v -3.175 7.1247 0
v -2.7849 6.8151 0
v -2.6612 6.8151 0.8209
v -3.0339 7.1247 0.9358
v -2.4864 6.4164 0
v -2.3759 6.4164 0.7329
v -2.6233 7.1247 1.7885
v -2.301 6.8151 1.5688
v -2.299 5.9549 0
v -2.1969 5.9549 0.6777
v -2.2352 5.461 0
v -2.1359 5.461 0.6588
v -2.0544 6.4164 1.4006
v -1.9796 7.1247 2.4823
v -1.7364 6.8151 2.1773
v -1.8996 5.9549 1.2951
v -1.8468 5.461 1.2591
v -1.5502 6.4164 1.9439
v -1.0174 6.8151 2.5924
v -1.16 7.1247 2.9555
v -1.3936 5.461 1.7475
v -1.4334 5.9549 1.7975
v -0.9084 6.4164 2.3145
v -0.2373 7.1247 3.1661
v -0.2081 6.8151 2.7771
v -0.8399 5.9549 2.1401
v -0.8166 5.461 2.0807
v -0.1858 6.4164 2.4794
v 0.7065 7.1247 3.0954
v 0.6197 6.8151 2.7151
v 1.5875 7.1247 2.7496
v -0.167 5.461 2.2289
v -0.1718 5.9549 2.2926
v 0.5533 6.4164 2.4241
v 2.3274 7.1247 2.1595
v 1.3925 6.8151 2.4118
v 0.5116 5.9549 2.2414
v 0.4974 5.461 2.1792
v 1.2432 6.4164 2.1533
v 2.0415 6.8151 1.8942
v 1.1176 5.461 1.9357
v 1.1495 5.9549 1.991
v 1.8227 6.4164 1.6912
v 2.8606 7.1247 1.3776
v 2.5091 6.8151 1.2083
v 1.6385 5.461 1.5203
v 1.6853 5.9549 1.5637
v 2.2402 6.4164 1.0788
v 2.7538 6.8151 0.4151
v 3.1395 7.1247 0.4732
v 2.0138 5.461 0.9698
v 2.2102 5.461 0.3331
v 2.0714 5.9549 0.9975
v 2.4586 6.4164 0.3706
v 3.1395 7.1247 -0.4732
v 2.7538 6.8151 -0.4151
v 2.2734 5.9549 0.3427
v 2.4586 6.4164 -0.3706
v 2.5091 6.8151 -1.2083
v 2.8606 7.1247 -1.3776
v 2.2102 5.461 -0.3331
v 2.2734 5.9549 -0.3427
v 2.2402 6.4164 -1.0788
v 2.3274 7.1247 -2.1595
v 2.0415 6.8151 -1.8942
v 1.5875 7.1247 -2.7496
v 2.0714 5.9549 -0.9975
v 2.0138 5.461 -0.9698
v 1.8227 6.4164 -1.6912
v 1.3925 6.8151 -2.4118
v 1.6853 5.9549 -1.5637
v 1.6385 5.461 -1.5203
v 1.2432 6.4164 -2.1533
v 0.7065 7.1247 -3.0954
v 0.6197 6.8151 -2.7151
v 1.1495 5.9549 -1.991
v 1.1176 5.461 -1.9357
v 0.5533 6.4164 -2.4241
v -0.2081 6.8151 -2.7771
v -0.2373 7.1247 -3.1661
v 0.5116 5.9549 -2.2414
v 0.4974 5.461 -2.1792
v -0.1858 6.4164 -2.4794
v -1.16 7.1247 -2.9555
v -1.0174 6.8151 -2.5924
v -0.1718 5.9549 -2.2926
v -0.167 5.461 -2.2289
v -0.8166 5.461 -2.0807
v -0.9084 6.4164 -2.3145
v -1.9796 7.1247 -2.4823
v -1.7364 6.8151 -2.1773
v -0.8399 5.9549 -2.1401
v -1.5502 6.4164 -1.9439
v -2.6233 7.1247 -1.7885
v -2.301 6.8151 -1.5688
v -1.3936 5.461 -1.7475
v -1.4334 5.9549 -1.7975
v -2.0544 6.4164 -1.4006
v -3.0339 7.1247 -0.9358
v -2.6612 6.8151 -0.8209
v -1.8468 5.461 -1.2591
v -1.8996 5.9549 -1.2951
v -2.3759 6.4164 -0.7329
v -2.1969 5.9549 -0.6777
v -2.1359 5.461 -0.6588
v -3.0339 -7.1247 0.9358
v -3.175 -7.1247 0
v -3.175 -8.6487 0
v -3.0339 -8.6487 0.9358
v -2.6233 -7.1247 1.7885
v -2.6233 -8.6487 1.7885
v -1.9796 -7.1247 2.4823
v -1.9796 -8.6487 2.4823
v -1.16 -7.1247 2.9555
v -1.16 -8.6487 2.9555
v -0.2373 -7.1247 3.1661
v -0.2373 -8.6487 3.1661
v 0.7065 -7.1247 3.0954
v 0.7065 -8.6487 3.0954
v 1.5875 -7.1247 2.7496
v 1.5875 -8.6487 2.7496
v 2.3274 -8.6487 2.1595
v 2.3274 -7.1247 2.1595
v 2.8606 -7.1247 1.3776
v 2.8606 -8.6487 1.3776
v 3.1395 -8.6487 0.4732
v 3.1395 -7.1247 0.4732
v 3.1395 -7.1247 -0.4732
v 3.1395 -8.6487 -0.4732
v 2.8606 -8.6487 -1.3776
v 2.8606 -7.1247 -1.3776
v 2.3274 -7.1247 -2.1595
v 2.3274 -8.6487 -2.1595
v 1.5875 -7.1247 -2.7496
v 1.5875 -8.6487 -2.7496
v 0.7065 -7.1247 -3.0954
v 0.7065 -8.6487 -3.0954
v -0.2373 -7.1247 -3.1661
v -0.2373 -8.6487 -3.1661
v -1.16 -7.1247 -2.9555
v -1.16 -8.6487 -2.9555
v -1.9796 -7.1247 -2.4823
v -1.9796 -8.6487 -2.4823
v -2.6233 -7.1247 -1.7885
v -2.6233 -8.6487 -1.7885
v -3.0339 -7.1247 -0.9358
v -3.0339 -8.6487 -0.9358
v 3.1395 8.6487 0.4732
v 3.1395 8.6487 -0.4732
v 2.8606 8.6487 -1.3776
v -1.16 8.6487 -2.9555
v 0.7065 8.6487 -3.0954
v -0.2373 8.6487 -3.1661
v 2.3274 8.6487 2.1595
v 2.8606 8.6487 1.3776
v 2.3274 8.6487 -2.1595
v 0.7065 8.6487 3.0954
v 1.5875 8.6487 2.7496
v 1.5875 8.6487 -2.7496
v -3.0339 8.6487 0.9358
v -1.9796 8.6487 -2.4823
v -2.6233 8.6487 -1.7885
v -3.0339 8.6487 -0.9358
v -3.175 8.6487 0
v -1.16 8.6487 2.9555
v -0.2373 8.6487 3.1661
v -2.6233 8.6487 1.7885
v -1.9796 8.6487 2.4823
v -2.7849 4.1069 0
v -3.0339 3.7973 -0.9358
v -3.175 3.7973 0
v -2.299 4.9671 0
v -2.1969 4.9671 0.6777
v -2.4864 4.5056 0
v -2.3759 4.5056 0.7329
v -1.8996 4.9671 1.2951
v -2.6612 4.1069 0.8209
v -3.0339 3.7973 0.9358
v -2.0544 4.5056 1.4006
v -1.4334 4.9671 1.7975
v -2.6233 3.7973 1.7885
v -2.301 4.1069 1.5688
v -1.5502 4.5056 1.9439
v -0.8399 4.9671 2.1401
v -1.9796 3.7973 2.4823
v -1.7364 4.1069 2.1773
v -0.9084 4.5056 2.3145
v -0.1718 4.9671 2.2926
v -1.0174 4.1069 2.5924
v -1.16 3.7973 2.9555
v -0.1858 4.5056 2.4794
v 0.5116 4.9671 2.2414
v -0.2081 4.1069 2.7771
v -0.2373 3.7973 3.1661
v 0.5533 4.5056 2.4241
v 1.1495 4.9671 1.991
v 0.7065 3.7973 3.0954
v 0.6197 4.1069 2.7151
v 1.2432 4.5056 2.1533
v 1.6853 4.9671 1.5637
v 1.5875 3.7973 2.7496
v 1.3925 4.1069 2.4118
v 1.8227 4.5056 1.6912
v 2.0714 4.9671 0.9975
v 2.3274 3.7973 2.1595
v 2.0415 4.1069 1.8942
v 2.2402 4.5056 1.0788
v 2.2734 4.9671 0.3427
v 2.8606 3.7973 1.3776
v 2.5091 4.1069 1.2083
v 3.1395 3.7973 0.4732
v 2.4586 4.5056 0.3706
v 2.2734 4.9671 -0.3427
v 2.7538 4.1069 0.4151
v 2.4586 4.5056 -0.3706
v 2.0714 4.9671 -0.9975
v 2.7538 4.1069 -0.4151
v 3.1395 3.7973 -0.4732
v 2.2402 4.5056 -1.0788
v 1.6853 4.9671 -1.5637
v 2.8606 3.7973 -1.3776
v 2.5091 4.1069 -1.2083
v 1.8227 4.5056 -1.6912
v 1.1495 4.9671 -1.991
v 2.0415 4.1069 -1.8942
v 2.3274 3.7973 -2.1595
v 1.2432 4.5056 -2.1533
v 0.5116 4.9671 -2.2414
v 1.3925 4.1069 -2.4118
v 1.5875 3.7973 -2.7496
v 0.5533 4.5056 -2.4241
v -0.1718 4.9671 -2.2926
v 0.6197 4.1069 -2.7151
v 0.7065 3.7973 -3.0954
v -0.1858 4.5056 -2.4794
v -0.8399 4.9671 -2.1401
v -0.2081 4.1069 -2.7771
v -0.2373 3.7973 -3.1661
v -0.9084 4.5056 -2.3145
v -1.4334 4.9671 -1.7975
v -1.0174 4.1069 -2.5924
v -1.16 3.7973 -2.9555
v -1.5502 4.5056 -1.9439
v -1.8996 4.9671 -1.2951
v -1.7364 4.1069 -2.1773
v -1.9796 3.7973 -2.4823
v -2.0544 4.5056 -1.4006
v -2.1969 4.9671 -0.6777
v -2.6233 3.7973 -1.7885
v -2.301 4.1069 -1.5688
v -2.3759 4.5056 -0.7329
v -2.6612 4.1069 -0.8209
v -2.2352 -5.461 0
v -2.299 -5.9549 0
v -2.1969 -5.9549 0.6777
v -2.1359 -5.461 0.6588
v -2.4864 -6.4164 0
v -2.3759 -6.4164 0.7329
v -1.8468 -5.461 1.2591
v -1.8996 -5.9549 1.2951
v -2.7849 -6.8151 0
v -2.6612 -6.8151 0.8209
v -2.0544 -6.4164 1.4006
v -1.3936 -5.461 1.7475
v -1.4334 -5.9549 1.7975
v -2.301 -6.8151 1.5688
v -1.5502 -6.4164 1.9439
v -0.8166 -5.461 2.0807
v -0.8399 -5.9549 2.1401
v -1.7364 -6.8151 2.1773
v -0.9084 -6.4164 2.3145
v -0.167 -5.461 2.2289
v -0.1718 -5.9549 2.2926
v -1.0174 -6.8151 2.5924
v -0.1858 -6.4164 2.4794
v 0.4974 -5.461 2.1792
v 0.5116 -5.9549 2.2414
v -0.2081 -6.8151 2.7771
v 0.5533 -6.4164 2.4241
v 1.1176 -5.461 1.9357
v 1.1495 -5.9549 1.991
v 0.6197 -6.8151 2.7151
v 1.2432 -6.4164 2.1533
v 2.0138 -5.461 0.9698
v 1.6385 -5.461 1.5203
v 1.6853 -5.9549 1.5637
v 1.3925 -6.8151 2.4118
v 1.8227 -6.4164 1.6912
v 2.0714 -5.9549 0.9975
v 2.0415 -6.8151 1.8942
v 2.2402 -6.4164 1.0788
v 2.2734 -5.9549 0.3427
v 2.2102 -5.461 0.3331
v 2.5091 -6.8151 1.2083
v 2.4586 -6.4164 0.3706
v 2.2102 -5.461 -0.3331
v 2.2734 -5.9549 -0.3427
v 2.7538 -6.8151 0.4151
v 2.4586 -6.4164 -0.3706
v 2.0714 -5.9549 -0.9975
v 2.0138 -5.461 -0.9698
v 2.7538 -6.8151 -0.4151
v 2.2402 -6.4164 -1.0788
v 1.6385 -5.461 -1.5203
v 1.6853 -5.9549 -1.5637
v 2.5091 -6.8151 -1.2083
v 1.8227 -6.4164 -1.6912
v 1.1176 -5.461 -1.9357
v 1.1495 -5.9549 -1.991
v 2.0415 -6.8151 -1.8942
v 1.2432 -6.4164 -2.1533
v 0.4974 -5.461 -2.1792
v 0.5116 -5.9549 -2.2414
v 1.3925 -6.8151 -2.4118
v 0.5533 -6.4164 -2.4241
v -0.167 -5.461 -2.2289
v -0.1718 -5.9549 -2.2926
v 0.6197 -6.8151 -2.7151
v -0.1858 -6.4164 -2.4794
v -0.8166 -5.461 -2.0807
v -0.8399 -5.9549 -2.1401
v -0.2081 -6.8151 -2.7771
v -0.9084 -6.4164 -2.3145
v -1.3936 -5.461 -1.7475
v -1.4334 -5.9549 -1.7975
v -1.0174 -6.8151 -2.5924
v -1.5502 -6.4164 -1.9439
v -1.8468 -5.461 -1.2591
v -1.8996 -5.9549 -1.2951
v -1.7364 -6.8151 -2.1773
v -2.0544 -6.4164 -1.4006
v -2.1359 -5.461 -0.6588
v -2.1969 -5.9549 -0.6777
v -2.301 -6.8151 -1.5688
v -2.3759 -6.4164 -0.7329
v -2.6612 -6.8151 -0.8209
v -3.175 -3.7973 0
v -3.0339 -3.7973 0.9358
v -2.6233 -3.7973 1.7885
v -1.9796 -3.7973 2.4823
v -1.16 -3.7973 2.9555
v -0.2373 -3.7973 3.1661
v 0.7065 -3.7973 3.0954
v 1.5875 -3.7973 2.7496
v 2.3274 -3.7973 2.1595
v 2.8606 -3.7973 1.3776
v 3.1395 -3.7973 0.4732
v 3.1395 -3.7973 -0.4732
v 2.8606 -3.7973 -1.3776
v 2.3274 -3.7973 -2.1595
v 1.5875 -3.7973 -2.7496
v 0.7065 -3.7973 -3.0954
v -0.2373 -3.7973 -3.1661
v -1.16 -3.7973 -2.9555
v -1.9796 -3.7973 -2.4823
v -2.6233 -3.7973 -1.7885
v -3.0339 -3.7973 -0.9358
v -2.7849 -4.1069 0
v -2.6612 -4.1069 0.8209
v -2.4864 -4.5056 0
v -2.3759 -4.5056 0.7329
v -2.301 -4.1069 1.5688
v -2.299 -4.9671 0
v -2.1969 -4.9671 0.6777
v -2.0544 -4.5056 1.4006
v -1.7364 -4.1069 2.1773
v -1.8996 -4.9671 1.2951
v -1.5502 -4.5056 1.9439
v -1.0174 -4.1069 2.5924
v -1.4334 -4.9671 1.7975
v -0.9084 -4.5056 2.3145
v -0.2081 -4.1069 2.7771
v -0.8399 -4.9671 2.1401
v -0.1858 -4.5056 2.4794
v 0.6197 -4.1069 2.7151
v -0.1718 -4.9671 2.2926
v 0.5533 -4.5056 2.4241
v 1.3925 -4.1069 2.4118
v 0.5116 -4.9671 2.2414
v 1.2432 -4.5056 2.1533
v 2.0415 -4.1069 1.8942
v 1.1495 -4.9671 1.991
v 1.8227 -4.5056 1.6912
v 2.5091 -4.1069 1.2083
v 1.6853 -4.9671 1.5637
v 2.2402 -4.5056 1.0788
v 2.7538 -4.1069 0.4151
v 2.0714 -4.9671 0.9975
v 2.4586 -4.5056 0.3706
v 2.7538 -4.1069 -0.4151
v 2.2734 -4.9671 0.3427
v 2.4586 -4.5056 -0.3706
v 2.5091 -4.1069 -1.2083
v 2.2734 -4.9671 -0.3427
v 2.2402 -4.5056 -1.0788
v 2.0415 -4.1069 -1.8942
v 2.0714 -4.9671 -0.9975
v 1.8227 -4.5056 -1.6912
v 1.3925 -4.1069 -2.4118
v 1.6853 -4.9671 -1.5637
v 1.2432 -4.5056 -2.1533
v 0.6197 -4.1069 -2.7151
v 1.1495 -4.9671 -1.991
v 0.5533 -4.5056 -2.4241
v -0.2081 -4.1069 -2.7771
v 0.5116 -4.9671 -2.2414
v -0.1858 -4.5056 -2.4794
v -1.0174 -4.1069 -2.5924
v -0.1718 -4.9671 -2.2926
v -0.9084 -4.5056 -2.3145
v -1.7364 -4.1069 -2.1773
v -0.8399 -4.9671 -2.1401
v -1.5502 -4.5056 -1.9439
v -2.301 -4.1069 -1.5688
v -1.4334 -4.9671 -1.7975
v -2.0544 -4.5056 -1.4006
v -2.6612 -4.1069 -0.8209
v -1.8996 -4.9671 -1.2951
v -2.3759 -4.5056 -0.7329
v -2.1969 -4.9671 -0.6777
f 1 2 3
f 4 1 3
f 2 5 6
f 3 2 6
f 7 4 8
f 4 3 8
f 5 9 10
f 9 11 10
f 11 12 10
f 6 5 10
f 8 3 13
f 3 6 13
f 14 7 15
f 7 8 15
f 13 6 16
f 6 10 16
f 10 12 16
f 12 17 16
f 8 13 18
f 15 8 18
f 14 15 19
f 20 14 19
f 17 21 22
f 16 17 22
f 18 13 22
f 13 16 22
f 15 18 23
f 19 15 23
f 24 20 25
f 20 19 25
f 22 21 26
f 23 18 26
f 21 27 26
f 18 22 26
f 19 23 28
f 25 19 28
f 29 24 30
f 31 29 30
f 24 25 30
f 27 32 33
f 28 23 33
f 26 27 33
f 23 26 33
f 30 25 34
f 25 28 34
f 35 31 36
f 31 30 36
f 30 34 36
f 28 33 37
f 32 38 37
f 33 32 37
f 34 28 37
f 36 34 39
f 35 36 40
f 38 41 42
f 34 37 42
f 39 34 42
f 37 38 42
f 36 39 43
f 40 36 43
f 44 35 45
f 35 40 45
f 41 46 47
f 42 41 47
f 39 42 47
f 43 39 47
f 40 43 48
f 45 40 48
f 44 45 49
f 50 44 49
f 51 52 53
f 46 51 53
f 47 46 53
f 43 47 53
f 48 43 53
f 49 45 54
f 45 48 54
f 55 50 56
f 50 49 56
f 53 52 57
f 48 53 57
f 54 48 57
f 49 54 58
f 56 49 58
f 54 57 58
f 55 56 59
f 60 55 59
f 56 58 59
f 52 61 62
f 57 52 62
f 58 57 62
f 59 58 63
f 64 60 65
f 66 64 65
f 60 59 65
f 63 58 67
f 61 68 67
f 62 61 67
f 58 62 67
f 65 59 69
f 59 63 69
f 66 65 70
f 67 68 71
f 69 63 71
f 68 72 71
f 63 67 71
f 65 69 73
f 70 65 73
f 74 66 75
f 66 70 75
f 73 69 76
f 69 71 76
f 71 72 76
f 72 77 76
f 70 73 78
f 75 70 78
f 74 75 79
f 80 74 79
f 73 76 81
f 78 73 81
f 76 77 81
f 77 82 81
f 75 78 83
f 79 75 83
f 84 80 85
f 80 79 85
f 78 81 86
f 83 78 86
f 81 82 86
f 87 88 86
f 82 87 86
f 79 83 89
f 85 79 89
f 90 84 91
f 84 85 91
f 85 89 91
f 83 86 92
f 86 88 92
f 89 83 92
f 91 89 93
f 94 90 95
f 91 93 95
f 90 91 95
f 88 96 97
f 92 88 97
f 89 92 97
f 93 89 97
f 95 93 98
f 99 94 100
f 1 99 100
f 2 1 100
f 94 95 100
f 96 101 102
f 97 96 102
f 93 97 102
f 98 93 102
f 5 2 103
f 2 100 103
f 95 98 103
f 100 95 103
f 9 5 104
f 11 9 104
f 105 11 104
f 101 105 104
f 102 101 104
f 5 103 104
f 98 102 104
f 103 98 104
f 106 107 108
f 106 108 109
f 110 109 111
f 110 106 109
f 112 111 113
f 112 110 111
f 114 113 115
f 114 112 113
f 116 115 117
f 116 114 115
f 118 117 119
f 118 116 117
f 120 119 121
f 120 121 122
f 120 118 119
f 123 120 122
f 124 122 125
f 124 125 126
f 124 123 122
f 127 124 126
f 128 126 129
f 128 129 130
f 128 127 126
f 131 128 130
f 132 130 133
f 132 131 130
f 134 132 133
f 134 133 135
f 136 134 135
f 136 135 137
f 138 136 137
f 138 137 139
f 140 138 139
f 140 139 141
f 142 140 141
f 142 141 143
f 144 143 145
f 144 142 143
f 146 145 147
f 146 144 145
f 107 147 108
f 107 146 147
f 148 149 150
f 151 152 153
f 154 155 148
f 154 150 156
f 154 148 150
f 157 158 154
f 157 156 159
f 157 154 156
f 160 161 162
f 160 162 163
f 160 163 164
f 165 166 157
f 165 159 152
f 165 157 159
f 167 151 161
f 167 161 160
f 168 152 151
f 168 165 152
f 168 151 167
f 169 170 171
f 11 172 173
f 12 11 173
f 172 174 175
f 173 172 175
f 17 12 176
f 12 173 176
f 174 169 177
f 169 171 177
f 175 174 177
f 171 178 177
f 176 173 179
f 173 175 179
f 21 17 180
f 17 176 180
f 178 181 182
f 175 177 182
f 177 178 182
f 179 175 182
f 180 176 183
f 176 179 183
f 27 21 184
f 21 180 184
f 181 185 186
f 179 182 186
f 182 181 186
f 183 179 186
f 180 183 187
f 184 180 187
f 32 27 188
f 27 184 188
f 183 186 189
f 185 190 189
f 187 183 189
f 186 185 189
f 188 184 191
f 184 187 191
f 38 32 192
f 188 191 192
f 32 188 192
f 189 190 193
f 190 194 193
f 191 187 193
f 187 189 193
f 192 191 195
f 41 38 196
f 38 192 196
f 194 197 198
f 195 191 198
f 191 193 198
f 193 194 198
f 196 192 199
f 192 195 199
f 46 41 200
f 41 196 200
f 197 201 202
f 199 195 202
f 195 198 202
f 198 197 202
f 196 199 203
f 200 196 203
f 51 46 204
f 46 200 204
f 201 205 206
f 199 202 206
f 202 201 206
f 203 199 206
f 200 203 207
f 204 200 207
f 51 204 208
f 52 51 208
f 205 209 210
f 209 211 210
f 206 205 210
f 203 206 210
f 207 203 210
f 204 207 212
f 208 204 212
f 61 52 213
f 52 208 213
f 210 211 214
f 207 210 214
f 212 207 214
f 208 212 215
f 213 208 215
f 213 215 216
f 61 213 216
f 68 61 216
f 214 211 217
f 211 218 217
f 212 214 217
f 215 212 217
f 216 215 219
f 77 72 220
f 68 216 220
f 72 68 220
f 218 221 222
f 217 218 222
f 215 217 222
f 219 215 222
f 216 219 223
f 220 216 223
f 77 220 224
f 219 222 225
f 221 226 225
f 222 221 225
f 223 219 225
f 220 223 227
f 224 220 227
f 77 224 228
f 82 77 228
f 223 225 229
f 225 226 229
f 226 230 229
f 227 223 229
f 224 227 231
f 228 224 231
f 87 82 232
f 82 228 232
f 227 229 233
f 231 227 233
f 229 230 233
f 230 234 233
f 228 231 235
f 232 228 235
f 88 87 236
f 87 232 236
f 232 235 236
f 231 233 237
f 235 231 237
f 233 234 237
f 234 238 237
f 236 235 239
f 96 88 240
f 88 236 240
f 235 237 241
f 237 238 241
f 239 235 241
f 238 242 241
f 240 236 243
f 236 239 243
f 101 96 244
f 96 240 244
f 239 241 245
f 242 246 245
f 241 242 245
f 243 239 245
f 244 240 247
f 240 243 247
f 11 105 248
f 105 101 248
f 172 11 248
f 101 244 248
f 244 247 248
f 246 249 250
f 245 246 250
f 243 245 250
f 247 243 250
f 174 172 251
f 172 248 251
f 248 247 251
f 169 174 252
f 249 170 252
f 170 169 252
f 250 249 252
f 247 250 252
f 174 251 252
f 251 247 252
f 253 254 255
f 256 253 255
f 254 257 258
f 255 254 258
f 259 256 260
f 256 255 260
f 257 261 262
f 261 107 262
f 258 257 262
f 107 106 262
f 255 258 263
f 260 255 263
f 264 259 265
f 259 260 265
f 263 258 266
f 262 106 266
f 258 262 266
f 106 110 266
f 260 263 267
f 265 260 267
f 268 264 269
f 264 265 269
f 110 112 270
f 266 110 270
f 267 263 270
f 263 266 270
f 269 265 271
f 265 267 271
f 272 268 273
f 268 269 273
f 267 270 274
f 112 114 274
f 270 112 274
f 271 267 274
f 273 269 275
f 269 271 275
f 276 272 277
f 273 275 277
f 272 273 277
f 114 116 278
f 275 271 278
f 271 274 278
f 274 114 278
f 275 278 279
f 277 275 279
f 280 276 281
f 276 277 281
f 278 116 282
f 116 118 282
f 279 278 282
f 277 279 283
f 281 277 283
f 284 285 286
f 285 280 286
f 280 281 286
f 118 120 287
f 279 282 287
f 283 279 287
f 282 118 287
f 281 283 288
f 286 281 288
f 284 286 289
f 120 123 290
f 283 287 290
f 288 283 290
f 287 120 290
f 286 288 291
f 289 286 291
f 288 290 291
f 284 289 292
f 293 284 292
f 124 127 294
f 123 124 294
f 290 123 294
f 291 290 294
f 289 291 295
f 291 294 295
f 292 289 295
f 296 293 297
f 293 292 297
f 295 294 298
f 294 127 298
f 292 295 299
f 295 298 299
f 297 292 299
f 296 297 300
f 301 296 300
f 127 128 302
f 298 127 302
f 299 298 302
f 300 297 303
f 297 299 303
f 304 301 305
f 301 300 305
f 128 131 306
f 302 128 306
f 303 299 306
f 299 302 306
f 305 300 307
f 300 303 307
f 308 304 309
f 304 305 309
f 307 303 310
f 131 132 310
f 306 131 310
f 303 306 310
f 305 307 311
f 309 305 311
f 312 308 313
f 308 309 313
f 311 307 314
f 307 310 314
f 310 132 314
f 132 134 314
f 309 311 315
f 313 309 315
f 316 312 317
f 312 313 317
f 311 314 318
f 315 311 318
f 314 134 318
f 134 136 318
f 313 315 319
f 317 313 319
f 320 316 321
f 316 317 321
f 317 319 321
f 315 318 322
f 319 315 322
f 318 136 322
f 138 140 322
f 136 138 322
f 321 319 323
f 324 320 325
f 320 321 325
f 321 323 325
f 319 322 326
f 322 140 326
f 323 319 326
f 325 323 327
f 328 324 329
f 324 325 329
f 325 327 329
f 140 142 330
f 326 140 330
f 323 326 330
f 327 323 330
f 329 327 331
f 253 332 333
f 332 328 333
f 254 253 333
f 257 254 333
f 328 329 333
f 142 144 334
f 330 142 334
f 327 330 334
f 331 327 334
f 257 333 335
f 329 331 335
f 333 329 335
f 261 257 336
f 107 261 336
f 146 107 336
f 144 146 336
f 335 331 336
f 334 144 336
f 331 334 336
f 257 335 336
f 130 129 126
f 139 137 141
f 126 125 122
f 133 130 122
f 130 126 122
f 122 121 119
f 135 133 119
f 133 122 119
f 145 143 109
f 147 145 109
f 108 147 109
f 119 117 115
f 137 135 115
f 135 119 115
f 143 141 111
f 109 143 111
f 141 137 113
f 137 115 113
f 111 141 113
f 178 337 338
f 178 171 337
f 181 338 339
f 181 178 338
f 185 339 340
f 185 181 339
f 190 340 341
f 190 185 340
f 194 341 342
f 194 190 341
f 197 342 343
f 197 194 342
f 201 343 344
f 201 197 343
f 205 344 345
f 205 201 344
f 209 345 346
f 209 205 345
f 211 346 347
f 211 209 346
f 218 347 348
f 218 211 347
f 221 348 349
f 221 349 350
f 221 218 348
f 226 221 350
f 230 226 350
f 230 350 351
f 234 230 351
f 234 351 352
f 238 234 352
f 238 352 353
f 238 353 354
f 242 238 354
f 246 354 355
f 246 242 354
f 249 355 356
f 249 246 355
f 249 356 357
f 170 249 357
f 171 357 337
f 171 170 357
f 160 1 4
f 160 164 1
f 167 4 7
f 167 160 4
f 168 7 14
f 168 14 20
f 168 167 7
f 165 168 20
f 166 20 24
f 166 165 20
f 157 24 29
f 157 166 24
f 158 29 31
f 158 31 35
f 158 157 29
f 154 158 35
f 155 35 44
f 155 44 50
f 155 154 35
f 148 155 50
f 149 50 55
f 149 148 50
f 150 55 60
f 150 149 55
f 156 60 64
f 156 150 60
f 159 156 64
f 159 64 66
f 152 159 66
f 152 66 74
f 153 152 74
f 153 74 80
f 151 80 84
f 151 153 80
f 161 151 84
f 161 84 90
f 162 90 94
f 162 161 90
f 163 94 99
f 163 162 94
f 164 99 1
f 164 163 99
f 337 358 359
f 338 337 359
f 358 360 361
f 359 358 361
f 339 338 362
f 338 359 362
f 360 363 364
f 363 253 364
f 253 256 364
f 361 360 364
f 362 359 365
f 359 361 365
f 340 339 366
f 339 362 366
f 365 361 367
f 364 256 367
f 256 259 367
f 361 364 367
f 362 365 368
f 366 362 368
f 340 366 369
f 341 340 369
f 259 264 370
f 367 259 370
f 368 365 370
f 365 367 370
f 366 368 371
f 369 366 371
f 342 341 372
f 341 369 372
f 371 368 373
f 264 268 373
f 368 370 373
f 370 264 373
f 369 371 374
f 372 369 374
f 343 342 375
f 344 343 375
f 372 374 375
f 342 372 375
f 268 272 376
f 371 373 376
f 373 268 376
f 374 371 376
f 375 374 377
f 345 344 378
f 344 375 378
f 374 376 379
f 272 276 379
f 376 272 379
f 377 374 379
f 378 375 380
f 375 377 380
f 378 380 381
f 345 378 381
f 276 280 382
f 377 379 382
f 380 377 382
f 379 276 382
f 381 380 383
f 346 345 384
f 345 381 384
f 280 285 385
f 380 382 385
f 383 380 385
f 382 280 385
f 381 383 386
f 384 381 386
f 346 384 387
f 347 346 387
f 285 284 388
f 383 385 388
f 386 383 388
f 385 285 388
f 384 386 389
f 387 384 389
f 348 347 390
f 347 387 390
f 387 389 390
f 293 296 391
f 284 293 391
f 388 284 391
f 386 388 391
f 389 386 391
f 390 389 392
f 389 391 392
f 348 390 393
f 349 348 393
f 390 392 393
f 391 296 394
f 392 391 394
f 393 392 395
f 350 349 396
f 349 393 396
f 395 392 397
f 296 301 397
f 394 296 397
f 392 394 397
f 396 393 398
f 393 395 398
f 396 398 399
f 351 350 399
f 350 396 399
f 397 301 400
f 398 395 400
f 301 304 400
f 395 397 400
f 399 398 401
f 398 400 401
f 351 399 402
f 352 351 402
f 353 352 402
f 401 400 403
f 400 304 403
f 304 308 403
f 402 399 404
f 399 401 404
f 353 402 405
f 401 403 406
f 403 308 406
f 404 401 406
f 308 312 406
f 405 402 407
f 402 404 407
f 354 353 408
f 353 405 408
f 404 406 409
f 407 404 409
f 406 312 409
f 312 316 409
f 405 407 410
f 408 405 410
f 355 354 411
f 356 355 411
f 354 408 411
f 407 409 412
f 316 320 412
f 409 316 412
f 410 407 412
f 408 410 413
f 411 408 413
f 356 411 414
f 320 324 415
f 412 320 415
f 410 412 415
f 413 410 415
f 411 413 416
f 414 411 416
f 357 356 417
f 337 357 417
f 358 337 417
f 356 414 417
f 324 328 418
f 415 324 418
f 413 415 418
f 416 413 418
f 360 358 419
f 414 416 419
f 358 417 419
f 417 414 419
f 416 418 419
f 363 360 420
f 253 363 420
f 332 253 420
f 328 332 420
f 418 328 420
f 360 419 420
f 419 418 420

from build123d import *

# Parameters (mm, degrees)
F0_W   = 2.2352
F0_H   = 1.524
F0_W_2 = 0.9398
F0_H_2 = 7.5946


# Not quite as in the source:
# - a feature names something its author has since deleted; it is built from what else it names


with BuildPart() as f1:
    # F0 (on Top) → F1 (revolve)
    with BuildSketch(Plane.XY):
        with Locations((1.1176, 7.8867)):
            Rectangle(F0_W, F0_H)
        Polygon((2.2352, 7.1247), (0, 7.1247), (0, 3.7973), (2.2352, 3.7973), (2.2352, 5.4609999998), align=None)
        with Locations((-2.7051, 7.8867)):
            Rectangle(F0_W_2, F0_H)
        with Locations((1.1176, 0)):
            Rectangle(F0_W, F0_H_2)
        with BuildLine():
            Line((-2.2352, 5.461), (-2.2352, 7.1247))
            Line((-2.2352, 7.1247), (-3.175, 7.1247))
            ThreePointArc((-3.175, 7.1247), (-2.4863911938, 6.4163954325), (-2.2352, 5.461))
        make_face()
        Polygon((2.2352, -3.7973), (0, -3.7973), (0, -7.1247), (2.2352, -7.1247), (2.2352, -5.4610000002), align=None)
        with BuildLine():
            Line((-3.175, 3.7973), (-2.2352, 3.7973))
            Line((-2.2352, 3.7973), (-2.2352, 5.461))
            ThreePointArc((-2.2352, 5.461), (-2.4863911938, 4.5056045675), (-3.175, 3.7973))
        make_face()
        with Locations((-2.7051, 0)):
            Rectangle(F0_W_2, F0_H_2)
        with Locations((1.1176, -7.8867)):
            Rectangle(F0_W, F0_H)
        with BuildLine():
            Line((-2.2352, -5.461), (-2.2352, -3.7973))
            Line((-2.2352, -3.7973), (-3.175, -3.7973))
            ThreePointArc((-3.175, -3.7973), (-2.4863911938, -4.5056045675), (-2.2352, -5.461))
        make_face()
        with Locations((-2.7051, -7.8867)):
            Rectangle(F0_W_2, F0_H)
        with BuildLine():
            Line((-3.175, -7.1247), (-2.2352, -7.1247))
            Line((-2.2352, -7.1247), (-2.2352, -5.461))
            ThreePointArc((-2.2352, -5.461), (-2.4863911938, -6.4163954325), (-3.175, -7.1247))
        make_face()
        with Locations((2.7051, -7.8867)):
            Rectangle(F0_W_2, F0_H)
    revolve(axis=Axis((0, 0, 0), (0, 1, 0)))


solid = f1.part
